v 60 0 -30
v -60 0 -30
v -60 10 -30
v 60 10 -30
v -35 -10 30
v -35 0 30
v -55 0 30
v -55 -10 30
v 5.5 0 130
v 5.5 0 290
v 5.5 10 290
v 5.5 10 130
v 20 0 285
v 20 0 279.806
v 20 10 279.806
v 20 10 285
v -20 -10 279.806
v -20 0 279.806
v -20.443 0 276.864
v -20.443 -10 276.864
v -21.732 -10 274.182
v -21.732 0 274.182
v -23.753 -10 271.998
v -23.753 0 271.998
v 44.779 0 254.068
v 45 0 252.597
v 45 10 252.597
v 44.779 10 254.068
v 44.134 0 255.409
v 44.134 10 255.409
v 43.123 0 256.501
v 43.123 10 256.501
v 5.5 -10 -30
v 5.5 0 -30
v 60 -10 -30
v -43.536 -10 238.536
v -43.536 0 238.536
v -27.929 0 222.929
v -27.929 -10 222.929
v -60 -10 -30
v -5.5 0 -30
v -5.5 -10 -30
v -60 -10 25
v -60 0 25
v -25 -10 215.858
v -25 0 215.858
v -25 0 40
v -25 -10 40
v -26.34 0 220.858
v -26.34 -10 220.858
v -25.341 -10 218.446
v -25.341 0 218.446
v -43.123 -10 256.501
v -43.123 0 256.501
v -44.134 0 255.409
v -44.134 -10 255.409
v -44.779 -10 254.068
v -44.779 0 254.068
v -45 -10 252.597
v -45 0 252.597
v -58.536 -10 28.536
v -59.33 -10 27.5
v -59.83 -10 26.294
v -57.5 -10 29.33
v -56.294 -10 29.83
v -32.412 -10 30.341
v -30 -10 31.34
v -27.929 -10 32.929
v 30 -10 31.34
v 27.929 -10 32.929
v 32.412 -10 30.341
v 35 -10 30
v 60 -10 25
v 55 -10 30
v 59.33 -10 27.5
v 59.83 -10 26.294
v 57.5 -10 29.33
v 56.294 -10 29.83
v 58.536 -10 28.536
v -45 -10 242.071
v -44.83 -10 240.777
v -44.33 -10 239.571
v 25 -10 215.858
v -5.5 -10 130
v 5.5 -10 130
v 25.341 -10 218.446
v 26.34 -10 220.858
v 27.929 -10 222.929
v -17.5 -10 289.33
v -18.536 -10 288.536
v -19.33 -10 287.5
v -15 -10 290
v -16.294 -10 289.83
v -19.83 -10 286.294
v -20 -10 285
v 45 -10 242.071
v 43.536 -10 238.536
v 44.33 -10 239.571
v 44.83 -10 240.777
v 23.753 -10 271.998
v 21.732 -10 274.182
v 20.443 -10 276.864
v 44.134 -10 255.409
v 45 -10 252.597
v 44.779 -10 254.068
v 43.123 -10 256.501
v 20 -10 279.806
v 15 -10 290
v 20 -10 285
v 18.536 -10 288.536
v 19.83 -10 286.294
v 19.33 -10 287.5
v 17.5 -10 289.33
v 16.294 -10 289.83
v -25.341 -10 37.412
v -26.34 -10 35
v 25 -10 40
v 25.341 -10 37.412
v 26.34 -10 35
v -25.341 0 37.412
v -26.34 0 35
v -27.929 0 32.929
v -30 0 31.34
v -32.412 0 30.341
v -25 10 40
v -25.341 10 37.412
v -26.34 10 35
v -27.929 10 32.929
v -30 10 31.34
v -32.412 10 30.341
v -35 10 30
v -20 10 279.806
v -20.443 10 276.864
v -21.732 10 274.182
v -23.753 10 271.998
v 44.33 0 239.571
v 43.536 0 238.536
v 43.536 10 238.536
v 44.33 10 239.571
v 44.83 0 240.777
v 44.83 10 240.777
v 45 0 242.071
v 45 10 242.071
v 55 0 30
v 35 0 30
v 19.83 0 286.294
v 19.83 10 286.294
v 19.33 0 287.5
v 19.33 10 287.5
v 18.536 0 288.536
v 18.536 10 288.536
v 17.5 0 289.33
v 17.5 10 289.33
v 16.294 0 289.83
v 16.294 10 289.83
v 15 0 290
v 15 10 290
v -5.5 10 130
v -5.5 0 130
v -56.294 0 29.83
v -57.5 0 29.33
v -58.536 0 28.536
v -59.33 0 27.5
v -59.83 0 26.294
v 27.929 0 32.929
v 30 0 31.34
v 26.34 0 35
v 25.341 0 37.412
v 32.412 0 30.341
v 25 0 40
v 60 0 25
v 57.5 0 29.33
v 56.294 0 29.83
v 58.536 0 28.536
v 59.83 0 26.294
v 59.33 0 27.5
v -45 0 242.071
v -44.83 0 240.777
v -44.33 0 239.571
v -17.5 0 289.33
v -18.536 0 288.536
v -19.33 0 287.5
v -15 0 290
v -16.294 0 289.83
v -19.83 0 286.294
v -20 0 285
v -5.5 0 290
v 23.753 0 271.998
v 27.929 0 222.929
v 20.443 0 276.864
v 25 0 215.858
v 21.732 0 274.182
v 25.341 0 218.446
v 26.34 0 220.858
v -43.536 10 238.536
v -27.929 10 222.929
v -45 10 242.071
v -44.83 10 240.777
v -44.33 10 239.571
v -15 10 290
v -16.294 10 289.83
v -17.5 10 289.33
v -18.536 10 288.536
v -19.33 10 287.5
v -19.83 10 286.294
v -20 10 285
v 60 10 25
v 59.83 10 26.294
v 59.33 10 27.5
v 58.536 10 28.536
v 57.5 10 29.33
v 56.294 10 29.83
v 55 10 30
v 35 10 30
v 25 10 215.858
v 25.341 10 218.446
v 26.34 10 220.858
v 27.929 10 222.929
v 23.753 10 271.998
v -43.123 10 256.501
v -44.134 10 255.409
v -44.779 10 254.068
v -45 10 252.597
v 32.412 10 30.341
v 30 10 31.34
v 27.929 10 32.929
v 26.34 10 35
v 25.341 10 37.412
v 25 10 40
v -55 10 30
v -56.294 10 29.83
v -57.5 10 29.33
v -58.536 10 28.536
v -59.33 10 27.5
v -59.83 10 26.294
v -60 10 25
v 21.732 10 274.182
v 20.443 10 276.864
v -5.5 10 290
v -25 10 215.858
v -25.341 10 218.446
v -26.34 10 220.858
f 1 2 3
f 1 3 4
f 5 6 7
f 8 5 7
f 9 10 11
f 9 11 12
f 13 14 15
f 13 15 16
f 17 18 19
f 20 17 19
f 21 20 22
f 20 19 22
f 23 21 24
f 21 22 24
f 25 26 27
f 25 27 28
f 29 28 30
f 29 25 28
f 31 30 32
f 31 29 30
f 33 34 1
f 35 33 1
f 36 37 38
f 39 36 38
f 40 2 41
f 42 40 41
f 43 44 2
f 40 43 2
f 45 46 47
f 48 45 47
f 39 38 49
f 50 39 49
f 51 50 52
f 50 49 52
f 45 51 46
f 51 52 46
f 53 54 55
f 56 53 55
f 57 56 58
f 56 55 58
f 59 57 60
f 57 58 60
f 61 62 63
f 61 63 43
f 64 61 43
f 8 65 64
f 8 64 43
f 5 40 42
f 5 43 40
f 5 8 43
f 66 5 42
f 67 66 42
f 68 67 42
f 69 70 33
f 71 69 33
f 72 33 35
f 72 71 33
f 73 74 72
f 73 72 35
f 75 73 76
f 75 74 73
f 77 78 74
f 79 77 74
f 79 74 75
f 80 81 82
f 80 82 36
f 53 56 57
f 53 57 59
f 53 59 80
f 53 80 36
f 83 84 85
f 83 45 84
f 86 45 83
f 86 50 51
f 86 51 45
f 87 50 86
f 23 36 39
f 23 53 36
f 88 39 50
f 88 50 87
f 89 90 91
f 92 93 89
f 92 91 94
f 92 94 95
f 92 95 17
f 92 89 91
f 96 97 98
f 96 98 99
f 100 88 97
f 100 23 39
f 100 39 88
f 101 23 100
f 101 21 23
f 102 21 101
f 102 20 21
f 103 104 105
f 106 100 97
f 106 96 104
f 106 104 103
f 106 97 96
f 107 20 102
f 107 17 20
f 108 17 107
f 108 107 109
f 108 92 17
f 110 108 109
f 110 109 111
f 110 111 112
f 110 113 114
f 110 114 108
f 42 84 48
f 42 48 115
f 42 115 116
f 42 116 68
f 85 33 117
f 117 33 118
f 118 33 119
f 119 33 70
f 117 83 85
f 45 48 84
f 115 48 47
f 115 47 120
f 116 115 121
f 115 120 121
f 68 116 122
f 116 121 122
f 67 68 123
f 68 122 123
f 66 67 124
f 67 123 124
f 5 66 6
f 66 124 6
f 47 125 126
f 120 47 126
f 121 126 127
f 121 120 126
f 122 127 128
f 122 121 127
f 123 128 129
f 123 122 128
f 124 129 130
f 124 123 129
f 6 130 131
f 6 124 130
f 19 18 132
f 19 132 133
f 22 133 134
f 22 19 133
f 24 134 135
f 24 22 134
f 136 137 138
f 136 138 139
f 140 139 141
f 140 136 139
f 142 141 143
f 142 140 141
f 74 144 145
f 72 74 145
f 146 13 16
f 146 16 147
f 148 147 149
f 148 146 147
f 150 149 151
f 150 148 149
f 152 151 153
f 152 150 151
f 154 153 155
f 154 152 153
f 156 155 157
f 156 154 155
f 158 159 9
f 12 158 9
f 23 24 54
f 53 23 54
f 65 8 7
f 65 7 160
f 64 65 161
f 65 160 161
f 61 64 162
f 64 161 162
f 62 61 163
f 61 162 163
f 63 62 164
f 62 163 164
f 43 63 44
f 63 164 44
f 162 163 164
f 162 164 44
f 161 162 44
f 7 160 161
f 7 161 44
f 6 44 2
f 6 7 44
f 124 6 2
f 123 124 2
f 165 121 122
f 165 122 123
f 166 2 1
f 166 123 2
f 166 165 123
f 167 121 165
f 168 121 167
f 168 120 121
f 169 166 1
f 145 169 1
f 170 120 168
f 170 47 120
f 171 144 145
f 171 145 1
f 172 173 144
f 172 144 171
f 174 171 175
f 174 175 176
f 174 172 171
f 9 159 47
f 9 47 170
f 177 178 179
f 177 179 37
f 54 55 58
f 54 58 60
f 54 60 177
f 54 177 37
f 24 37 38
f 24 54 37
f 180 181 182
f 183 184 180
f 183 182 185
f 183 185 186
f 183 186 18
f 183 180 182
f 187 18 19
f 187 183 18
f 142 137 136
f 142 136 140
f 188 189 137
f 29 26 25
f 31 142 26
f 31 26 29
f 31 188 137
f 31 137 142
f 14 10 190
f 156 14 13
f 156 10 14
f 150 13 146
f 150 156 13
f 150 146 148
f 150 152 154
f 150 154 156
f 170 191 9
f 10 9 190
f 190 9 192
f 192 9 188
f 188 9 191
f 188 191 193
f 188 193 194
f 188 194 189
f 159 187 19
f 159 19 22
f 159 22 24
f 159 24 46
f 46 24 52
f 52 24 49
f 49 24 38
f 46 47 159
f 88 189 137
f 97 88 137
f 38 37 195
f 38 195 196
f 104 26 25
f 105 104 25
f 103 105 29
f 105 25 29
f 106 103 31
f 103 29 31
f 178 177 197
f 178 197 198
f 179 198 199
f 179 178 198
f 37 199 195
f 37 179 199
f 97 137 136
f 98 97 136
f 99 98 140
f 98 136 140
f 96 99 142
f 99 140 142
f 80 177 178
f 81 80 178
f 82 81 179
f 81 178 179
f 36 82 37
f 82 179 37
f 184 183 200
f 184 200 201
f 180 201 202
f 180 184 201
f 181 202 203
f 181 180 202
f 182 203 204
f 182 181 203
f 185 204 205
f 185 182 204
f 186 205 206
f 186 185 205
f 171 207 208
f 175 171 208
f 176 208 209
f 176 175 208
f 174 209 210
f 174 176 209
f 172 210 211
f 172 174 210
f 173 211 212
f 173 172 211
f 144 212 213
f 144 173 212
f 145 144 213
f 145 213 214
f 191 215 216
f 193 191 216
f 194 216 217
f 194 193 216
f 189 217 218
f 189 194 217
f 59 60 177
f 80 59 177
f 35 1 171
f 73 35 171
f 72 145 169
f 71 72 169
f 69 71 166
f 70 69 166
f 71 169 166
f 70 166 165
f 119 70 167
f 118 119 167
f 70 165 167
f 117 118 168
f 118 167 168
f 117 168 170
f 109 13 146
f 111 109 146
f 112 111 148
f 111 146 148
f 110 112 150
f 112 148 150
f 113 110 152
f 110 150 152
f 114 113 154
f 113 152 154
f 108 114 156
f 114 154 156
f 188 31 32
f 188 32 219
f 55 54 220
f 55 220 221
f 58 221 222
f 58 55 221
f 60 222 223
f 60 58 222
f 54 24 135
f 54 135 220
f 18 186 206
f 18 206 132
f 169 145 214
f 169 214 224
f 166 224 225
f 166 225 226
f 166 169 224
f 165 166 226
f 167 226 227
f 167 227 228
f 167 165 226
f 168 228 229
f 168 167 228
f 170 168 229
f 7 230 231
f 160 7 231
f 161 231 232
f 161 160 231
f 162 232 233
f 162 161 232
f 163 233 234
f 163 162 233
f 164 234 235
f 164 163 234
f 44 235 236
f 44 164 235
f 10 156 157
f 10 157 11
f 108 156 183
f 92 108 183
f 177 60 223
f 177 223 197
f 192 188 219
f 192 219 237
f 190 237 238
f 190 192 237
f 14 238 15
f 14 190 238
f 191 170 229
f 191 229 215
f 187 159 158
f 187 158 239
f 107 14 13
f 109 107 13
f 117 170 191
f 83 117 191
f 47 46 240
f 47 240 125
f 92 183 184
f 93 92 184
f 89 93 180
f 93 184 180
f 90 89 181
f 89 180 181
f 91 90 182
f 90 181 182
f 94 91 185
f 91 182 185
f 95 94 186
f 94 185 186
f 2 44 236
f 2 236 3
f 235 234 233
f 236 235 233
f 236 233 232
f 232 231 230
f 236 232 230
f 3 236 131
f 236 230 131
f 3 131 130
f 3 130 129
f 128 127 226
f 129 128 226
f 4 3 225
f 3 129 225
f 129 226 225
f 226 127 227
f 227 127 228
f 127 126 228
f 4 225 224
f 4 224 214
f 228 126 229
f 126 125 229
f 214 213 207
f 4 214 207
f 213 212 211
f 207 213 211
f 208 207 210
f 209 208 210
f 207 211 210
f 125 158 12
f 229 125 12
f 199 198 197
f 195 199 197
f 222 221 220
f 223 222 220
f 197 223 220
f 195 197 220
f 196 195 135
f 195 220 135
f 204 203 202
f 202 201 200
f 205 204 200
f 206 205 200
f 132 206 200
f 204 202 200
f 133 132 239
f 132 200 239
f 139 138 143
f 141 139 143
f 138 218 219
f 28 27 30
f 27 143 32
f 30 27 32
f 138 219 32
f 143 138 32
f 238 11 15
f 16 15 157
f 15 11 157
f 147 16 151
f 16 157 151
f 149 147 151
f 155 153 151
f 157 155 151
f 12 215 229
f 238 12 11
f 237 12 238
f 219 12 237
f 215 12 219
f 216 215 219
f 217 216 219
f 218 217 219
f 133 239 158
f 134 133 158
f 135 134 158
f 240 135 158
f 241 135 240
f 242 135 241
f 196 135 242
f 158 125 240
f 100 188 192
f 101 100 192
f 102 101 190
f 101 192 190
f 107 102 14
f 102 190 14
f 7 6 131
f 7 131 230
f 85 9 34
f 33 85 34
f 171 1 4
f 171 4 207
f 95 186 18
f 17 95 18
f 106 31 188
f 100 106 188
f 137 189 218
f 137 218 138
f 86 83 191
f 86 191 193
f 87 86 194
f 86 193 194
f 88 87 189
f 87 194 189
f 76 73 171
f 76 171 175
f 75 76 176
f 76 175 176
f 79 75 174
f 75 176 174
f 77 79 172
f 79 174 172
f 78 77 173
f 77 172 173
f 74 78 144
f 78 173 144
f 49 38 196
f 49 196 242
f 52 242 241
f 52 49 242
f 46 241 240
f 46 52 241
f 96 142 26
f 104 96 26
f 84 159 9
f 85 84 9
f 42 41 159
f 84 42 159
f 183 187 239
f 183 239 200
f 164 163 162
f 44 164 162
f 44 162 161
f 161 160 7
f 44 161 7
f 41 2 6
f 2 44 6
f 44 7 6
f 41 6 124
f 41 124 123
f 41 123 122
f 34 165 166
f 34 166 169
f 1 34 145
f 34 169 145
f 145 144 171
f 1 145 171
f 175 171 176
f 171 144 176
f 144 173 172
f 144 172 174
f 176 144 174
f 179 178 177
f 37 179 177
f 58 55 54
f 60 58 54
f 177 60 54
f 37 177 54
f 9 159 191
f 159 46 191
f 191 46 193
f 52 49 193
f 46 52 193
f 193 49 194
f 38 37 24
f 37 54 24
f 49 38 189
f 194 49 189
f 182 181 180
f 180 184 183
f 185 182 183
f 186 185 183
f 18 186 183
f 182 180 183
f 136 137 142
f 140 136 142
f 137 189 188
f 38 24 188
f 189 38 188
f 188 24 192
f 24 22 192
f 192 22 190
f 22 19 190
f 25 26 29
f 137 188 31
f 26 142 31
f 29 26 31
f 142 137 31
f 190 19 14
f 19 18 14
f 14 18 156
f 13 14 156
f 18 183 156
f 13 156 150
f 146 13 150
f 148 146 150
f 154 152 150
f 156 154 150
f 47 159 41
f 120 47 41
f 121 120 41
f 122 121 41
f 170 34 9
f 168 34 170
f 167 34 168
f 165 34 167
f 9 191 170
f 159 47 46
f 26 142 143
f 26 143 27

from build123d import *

# Parameters (mm, degrees)
F0_W     = 11
F0_H     = 160
F1_DEPTH = 10
F2_DEPTH = 10


with BuildPart() as f1:
    # F0 (on Front) → F1 (new body)
    with BuildSketch(Plane.XZ):
        with BuildLine():
            Line((-60, -30), (-5.5, -30))
            Line((-5.5, -30), (-5.5, 130))
            Line((-5.5, 130), (-5.5, 290))
            Line((-5.5, 290), (-15, 290))
            ThreePointArc((-15, 290), (-18.535534, 288.535534), (-20, 285))
            Line((-20, 285), (-20, 279.806248))
            ThreePointArc((-20, 279.806248), (-20.986968, 275.474361), (-23.75305, 271.99756))
            Line((-23.75305, 271.99756), (-43.123475, 256.50122))
            ThreePointArc((-43.123475, 256.50122), (-44.506516, 254.762819), (-45, 252.596876))
            Line((-45, 252.596876), (-45, 242.071068))
            ThreePointArc((-45, 242.071068), (-44.619398, 240.157651), (-43.535534, 238.535534))
            Line((-43.535534, 238.535534), (-27.928932, 222.928932))
            ThreePointArc((-27.928932, 222.928932), (-25.761205, 219.684699), (-25, 215.857864))
            Line((-25, 215.857864), (-25, 40))
            ThreePointArc((-25, 40), (-27.928932, 32.928932), (-35, 30))
            Line((-35, 30), (-55, 30))
            ThreePointArc((-55, 30), (-58.535534, 28.535534), (-60, 25))
            Line((-60, 25), (-60, -30))
        make_face()
        with BuildLine():
            ThreePointArc((60, 25), (58.535534, 28.535534), (55, 30))
            Line((55, 30), (35, 30))
            ThreePointArc((35, 30), (27.928932, 32.928932), (25, 40))
            Line((25, 40), (25, 215.857864))
            ThreePointArc((25, 215.857864), (25.761205, 219.684699), (27.928932, 222.928932))
            Line((27.928932, 222.928932), (43.535534, 238.535534))
            ThreePointArc((43.535534, 238.535534), (44.619398, 240.157651), (45, 242.071068))
            Line((45, 242.071068), (45, 252.596876))
            ThreePointArc((45, 252.596876), (44.506516, 254.762819), (43.123475, 256.50122))
            Line((43.123475, 256.50122), (23.75305, 271.99756))
            ThreePointArc((23.75305, 271.99756), (20.986968, 275.474361), (20, 279.806248))
            Line((20, 279.806248), (20, 285))
            ThreePointArc((20, 285), (18.535534, 288.535534), (15, 290))
            Line((15, 290), (5.5, 290))
            Line((5.5, 290), (5.5, 130))
            Line((5.5, 130), (5.5, -30))
            Line((5.5, -30), (60, -30))
            Line((60, -30), (60, 25))
        make_face()
        with Locations((0, 210)):
            Rectangle(F0_W, F0_H)
    extrude(amount=F1_DEPTH)


with BuildPart() as f2:
    # F0 (on Front) → F2 (new body)
    with BuildSketch(Plane.XZ):
        with BuildLine():
            Line((-60, -30), (-5.5, -30))
            Line((-5.5, -30), (-5.5, 130))
            Line((-5.5, 130), (-5.5, 290))
            Line((-5.5, 290), (-15, 290))
            ThreePointArc((-15, 290), (-18.535534, 288.535534), (-20, 285))
            Line((-20, 285), (-20, 279.806248))
            ThreePointArc((-20, 279.806248), (-20.986968, 275.474361), (-23.75305, 271.99756))
            Line((-23.75305, 271.99756), (-43.123475, 256.50122))
            ThreePointArc((-43.123475, 256.50122), (-44.506516, 254.762819), (-45, 252.596876))
            Line((-45, 252.596876), (-45, 242.071068))
            ThreePointArc((-45, 242.071068), (-44.619398, 240.157651), (-43.535534, 238.535534))
            Line((-43.535534, 238.535534), (-27.928932, 222.928932))
            ThreePointArc((-27.928932, 222.928932), (-25.761205, 219.684699), (-25, 215.857864))
            Line((-25, 215.857864), (-25, 40))
            ThreePointArc((-25, 40), (-27.928932, 32.928932), (-35, 30))
            Line((-35, 30), (-55, 30))
            ThreePointArc((-55, 30), (-58.535534, 28.535534), (-60, 25))
            Line((-60, 25), (-60, -30))
        make_face()
        with BuildLine():
            ThreePointArc((60, 25), (58.535534, 28.535534), (55, 30))
            Line((55, 30), (35, 30))
            ThreePointArc((35, 30), (27.928932, 32.928932), (25, 40))
            Line((25, 40), (25, 215.857864))
            ThreePointArc((25, 215.857864), (25.761205, 219.684699), (27.928932, 222.928932))
            Line((27.928932, 222.928932), (43.535534, 238.535534))
            ThreePointArc((43.535534, 238.535534), (44.619398, 240.157651), (45, 242.071068))
            Line((45, 242.071068), (45, 252.596876))
            ThreePointArc((45, 252.596876), (44.506516, 254.762819), (43.123475, 256.50122))
            Line((43.123475, 256.50122), (23.75305, 271.99756))
            ThreePointArc((23.75305, 271.99756), (20.986968, 275.474361), (20, 279.806248))
            Line((20, 279.806248), (20, 285))
            ThreePointArc((20, 285), (18.535534, 288.535534), (15, 290))
            Line((15, 290), (5.5, 290))
            Line((5.5, 290), (5.5, 130))
            Line((5.5, 130), (5.5, -30))
            Line((5.5, -30), (60, -30))
            Line((60, -30), (60, 25))
        make_face()
        with Locations((0, 50)):
            Rectangle(F0_W, F0_H)
    extrude(amount=-F2_DEPTH)


solid = Compound([f1.part, f2.part])
